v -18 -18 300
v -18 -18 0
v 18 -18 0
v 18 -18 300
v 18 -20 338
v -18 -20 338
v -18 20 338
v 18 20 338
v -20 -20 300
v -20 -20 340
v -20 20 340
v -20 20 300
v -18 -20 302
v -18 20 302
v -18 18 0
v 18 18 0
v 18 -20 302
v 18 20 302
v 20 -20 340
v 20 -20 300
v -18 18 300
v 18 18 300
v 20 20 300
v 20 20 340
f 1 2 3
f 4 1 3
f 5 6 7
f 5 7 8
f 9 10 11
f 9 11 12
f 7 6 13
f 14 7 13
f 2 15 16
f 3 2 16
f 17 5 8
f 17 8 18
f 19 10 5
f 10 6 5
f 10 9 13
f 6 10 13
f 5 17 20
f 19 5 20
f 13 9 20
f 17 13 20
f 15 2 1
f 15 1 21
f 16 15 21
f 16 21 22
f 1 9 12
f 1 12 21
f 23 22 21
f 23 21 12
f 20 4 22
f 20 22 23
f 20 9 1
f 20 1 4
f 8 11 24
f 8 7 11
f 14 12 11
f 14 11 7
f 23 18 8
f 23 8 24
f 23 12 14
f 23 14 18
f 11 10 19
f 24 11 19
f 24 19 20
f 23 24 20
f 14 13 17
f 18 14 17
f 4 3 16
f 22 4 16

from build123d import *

# Parameters (mm, degrees)
SKETCH1_W                = 36
SKETCH1_H                = 36
BOSS_EXTRUDE1_DEPTH      = 300
BOSS_EXTRUDE2_DEPTH      = 20
BOSS_EXTRUDE2_DEPTH_BACK = 20
SKETCH2_W                = 40
SKETCH2_H                = 40
SKETCH2_W_2              = 36
SKETCH2_H_2              = 36


with BuildPart() as part:
    # Sketch1 → Boss-Extrude1 (new body)
    with BuildSketch(Plane.XY):
        Rectangle(SKETCH1_W, SKETCH1_H)
    extrude(amount=BOSS_EXTRUDE1_DEPTH)

    # Sketch2 → Boss-Extrude2 (add, two sides: drawn at the far end of the back side and taken through both)
    with BuildSketch(Plane(origin=(0, 0, 0), x_dir=(1, 0, 0), z_dir=(0, 1, 0)).offset(-BOSS_EXTRUDE2_DEPTH_BACK)):
        with Locations((0, -320)):
            Rectangle(SKETCH2_W, SKETCH2_H)
        with Locations((0, -320)):
            Rectangle(SKETCH2_W_2, SKETCH2_H_2, mode=Mode.SUBTRACT)
    extrude(amount=BOSS_EXTRUDE2_DEPTH + BOSS_EXTRUDE2_DEPTH_BACK)


solid = part.part
